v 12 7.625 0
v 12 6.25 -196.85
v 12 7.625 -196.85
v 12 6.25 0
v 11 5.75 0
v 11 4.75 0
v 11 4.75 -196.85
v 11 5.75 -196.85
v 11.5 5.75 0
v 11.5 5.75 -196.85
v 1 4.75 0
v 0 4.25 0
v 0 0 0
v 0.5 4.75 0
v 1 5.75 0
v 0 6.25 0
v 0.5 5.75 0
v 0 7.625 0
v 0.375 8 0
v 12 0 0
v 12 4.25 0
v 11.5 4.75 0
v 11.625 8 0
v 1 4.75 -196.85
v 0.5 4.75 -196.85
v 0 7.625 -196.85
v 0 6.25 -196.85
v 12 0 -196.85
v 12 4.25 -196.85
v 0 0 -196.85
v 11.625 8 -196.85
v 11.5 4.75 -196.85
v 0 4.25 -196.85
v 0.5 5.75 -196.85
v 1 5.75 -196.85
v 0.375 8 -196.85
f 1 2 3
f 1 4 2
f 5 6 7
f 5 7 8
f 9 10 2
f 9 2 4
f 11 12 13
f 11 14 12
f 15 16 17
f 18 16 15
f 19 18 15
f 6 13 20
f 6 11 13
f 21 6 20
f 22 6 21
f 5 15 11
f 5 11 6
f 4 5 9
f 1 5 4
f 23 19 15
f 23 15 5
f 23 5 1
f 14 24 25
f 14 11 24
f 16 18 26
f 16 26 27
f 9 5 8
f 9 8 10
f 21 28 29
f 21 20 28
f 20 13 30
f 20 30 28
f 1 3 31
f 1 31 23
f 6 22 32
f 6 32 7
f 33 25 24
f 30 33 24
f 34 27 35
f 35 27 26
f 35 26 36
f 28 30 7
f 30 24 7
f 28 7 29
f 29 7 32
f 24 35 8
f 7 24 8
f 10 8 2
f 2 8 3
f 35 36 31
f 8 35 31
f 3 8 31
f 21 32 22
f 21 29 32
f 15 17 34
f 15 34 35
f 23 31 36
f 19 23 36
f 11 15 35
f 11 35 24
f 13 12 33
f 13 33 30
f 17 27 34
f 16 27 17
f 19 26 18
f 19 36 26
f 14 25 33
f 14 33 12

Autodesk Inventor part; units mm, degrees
ref_plane "YZ Plane" through (0, 0, 0) normal (1, 0, 0) x (0, 1, 0)
ref_plane "XZ Plane" through (0, 0, 0) normal (0, 1, 0) x (-1, 0, 0)
ref_plane "XY Plane" through (0, 0, 0) normal (0, 0, 1) x (1, 0, 0)
sketch "Sketch1" plane through (0, 0, 0) normal (0, 0, 1) x (1, 0, 0)
  line L0 (0, 0) -> (12, 0)
  line L1 (12, 0) -> (12, 8)
  line L2 (12, 8) -> (0, 8)
  line L3 (0, 8) -> (0, 0)
  line L4 (12, 8) -> (12, 4.75)
  line L5 (12, 4.75) -> (11, 4.75)
  line L6 (11, 4.75) -> (11, 5.75)
  line L7 (11, 5.75) -> (12, 5.75)
  line L8 (0, 5.75) -> (1, 5.75)
  line L9 (1, 5.75) -> (1, 4.75)
  line L10 (1, 4.75) -> (0, 4.75)
  dimension "d0" = 8
  dimension "d1" = 12
  dimension "d2" = 3.25
  dimension "d3" = 2.25
  dimension "d4" = 1
  dimension "d5" = 1
extrude "Extrusion1" add sketch "Sketch1" against normal blind 196.85 contours L3 L10 L9 L8 L2 L1 L7 L6 L5 L0
chamfer "Chamfer1" distance 0.5 angle 45 4 edges at (12, 5.75, -98.425) (12, 4.75, -98.425) (0, 5.75, -98.425) (0, 4.75, -98.425)
chamfer "Chamfer2" distance 0.375 angle 45 2 edges at (12, 8, -98.425) (0, 8, -98.425)
equation "\"d4\" = d5"
properties part number "MGN12"
